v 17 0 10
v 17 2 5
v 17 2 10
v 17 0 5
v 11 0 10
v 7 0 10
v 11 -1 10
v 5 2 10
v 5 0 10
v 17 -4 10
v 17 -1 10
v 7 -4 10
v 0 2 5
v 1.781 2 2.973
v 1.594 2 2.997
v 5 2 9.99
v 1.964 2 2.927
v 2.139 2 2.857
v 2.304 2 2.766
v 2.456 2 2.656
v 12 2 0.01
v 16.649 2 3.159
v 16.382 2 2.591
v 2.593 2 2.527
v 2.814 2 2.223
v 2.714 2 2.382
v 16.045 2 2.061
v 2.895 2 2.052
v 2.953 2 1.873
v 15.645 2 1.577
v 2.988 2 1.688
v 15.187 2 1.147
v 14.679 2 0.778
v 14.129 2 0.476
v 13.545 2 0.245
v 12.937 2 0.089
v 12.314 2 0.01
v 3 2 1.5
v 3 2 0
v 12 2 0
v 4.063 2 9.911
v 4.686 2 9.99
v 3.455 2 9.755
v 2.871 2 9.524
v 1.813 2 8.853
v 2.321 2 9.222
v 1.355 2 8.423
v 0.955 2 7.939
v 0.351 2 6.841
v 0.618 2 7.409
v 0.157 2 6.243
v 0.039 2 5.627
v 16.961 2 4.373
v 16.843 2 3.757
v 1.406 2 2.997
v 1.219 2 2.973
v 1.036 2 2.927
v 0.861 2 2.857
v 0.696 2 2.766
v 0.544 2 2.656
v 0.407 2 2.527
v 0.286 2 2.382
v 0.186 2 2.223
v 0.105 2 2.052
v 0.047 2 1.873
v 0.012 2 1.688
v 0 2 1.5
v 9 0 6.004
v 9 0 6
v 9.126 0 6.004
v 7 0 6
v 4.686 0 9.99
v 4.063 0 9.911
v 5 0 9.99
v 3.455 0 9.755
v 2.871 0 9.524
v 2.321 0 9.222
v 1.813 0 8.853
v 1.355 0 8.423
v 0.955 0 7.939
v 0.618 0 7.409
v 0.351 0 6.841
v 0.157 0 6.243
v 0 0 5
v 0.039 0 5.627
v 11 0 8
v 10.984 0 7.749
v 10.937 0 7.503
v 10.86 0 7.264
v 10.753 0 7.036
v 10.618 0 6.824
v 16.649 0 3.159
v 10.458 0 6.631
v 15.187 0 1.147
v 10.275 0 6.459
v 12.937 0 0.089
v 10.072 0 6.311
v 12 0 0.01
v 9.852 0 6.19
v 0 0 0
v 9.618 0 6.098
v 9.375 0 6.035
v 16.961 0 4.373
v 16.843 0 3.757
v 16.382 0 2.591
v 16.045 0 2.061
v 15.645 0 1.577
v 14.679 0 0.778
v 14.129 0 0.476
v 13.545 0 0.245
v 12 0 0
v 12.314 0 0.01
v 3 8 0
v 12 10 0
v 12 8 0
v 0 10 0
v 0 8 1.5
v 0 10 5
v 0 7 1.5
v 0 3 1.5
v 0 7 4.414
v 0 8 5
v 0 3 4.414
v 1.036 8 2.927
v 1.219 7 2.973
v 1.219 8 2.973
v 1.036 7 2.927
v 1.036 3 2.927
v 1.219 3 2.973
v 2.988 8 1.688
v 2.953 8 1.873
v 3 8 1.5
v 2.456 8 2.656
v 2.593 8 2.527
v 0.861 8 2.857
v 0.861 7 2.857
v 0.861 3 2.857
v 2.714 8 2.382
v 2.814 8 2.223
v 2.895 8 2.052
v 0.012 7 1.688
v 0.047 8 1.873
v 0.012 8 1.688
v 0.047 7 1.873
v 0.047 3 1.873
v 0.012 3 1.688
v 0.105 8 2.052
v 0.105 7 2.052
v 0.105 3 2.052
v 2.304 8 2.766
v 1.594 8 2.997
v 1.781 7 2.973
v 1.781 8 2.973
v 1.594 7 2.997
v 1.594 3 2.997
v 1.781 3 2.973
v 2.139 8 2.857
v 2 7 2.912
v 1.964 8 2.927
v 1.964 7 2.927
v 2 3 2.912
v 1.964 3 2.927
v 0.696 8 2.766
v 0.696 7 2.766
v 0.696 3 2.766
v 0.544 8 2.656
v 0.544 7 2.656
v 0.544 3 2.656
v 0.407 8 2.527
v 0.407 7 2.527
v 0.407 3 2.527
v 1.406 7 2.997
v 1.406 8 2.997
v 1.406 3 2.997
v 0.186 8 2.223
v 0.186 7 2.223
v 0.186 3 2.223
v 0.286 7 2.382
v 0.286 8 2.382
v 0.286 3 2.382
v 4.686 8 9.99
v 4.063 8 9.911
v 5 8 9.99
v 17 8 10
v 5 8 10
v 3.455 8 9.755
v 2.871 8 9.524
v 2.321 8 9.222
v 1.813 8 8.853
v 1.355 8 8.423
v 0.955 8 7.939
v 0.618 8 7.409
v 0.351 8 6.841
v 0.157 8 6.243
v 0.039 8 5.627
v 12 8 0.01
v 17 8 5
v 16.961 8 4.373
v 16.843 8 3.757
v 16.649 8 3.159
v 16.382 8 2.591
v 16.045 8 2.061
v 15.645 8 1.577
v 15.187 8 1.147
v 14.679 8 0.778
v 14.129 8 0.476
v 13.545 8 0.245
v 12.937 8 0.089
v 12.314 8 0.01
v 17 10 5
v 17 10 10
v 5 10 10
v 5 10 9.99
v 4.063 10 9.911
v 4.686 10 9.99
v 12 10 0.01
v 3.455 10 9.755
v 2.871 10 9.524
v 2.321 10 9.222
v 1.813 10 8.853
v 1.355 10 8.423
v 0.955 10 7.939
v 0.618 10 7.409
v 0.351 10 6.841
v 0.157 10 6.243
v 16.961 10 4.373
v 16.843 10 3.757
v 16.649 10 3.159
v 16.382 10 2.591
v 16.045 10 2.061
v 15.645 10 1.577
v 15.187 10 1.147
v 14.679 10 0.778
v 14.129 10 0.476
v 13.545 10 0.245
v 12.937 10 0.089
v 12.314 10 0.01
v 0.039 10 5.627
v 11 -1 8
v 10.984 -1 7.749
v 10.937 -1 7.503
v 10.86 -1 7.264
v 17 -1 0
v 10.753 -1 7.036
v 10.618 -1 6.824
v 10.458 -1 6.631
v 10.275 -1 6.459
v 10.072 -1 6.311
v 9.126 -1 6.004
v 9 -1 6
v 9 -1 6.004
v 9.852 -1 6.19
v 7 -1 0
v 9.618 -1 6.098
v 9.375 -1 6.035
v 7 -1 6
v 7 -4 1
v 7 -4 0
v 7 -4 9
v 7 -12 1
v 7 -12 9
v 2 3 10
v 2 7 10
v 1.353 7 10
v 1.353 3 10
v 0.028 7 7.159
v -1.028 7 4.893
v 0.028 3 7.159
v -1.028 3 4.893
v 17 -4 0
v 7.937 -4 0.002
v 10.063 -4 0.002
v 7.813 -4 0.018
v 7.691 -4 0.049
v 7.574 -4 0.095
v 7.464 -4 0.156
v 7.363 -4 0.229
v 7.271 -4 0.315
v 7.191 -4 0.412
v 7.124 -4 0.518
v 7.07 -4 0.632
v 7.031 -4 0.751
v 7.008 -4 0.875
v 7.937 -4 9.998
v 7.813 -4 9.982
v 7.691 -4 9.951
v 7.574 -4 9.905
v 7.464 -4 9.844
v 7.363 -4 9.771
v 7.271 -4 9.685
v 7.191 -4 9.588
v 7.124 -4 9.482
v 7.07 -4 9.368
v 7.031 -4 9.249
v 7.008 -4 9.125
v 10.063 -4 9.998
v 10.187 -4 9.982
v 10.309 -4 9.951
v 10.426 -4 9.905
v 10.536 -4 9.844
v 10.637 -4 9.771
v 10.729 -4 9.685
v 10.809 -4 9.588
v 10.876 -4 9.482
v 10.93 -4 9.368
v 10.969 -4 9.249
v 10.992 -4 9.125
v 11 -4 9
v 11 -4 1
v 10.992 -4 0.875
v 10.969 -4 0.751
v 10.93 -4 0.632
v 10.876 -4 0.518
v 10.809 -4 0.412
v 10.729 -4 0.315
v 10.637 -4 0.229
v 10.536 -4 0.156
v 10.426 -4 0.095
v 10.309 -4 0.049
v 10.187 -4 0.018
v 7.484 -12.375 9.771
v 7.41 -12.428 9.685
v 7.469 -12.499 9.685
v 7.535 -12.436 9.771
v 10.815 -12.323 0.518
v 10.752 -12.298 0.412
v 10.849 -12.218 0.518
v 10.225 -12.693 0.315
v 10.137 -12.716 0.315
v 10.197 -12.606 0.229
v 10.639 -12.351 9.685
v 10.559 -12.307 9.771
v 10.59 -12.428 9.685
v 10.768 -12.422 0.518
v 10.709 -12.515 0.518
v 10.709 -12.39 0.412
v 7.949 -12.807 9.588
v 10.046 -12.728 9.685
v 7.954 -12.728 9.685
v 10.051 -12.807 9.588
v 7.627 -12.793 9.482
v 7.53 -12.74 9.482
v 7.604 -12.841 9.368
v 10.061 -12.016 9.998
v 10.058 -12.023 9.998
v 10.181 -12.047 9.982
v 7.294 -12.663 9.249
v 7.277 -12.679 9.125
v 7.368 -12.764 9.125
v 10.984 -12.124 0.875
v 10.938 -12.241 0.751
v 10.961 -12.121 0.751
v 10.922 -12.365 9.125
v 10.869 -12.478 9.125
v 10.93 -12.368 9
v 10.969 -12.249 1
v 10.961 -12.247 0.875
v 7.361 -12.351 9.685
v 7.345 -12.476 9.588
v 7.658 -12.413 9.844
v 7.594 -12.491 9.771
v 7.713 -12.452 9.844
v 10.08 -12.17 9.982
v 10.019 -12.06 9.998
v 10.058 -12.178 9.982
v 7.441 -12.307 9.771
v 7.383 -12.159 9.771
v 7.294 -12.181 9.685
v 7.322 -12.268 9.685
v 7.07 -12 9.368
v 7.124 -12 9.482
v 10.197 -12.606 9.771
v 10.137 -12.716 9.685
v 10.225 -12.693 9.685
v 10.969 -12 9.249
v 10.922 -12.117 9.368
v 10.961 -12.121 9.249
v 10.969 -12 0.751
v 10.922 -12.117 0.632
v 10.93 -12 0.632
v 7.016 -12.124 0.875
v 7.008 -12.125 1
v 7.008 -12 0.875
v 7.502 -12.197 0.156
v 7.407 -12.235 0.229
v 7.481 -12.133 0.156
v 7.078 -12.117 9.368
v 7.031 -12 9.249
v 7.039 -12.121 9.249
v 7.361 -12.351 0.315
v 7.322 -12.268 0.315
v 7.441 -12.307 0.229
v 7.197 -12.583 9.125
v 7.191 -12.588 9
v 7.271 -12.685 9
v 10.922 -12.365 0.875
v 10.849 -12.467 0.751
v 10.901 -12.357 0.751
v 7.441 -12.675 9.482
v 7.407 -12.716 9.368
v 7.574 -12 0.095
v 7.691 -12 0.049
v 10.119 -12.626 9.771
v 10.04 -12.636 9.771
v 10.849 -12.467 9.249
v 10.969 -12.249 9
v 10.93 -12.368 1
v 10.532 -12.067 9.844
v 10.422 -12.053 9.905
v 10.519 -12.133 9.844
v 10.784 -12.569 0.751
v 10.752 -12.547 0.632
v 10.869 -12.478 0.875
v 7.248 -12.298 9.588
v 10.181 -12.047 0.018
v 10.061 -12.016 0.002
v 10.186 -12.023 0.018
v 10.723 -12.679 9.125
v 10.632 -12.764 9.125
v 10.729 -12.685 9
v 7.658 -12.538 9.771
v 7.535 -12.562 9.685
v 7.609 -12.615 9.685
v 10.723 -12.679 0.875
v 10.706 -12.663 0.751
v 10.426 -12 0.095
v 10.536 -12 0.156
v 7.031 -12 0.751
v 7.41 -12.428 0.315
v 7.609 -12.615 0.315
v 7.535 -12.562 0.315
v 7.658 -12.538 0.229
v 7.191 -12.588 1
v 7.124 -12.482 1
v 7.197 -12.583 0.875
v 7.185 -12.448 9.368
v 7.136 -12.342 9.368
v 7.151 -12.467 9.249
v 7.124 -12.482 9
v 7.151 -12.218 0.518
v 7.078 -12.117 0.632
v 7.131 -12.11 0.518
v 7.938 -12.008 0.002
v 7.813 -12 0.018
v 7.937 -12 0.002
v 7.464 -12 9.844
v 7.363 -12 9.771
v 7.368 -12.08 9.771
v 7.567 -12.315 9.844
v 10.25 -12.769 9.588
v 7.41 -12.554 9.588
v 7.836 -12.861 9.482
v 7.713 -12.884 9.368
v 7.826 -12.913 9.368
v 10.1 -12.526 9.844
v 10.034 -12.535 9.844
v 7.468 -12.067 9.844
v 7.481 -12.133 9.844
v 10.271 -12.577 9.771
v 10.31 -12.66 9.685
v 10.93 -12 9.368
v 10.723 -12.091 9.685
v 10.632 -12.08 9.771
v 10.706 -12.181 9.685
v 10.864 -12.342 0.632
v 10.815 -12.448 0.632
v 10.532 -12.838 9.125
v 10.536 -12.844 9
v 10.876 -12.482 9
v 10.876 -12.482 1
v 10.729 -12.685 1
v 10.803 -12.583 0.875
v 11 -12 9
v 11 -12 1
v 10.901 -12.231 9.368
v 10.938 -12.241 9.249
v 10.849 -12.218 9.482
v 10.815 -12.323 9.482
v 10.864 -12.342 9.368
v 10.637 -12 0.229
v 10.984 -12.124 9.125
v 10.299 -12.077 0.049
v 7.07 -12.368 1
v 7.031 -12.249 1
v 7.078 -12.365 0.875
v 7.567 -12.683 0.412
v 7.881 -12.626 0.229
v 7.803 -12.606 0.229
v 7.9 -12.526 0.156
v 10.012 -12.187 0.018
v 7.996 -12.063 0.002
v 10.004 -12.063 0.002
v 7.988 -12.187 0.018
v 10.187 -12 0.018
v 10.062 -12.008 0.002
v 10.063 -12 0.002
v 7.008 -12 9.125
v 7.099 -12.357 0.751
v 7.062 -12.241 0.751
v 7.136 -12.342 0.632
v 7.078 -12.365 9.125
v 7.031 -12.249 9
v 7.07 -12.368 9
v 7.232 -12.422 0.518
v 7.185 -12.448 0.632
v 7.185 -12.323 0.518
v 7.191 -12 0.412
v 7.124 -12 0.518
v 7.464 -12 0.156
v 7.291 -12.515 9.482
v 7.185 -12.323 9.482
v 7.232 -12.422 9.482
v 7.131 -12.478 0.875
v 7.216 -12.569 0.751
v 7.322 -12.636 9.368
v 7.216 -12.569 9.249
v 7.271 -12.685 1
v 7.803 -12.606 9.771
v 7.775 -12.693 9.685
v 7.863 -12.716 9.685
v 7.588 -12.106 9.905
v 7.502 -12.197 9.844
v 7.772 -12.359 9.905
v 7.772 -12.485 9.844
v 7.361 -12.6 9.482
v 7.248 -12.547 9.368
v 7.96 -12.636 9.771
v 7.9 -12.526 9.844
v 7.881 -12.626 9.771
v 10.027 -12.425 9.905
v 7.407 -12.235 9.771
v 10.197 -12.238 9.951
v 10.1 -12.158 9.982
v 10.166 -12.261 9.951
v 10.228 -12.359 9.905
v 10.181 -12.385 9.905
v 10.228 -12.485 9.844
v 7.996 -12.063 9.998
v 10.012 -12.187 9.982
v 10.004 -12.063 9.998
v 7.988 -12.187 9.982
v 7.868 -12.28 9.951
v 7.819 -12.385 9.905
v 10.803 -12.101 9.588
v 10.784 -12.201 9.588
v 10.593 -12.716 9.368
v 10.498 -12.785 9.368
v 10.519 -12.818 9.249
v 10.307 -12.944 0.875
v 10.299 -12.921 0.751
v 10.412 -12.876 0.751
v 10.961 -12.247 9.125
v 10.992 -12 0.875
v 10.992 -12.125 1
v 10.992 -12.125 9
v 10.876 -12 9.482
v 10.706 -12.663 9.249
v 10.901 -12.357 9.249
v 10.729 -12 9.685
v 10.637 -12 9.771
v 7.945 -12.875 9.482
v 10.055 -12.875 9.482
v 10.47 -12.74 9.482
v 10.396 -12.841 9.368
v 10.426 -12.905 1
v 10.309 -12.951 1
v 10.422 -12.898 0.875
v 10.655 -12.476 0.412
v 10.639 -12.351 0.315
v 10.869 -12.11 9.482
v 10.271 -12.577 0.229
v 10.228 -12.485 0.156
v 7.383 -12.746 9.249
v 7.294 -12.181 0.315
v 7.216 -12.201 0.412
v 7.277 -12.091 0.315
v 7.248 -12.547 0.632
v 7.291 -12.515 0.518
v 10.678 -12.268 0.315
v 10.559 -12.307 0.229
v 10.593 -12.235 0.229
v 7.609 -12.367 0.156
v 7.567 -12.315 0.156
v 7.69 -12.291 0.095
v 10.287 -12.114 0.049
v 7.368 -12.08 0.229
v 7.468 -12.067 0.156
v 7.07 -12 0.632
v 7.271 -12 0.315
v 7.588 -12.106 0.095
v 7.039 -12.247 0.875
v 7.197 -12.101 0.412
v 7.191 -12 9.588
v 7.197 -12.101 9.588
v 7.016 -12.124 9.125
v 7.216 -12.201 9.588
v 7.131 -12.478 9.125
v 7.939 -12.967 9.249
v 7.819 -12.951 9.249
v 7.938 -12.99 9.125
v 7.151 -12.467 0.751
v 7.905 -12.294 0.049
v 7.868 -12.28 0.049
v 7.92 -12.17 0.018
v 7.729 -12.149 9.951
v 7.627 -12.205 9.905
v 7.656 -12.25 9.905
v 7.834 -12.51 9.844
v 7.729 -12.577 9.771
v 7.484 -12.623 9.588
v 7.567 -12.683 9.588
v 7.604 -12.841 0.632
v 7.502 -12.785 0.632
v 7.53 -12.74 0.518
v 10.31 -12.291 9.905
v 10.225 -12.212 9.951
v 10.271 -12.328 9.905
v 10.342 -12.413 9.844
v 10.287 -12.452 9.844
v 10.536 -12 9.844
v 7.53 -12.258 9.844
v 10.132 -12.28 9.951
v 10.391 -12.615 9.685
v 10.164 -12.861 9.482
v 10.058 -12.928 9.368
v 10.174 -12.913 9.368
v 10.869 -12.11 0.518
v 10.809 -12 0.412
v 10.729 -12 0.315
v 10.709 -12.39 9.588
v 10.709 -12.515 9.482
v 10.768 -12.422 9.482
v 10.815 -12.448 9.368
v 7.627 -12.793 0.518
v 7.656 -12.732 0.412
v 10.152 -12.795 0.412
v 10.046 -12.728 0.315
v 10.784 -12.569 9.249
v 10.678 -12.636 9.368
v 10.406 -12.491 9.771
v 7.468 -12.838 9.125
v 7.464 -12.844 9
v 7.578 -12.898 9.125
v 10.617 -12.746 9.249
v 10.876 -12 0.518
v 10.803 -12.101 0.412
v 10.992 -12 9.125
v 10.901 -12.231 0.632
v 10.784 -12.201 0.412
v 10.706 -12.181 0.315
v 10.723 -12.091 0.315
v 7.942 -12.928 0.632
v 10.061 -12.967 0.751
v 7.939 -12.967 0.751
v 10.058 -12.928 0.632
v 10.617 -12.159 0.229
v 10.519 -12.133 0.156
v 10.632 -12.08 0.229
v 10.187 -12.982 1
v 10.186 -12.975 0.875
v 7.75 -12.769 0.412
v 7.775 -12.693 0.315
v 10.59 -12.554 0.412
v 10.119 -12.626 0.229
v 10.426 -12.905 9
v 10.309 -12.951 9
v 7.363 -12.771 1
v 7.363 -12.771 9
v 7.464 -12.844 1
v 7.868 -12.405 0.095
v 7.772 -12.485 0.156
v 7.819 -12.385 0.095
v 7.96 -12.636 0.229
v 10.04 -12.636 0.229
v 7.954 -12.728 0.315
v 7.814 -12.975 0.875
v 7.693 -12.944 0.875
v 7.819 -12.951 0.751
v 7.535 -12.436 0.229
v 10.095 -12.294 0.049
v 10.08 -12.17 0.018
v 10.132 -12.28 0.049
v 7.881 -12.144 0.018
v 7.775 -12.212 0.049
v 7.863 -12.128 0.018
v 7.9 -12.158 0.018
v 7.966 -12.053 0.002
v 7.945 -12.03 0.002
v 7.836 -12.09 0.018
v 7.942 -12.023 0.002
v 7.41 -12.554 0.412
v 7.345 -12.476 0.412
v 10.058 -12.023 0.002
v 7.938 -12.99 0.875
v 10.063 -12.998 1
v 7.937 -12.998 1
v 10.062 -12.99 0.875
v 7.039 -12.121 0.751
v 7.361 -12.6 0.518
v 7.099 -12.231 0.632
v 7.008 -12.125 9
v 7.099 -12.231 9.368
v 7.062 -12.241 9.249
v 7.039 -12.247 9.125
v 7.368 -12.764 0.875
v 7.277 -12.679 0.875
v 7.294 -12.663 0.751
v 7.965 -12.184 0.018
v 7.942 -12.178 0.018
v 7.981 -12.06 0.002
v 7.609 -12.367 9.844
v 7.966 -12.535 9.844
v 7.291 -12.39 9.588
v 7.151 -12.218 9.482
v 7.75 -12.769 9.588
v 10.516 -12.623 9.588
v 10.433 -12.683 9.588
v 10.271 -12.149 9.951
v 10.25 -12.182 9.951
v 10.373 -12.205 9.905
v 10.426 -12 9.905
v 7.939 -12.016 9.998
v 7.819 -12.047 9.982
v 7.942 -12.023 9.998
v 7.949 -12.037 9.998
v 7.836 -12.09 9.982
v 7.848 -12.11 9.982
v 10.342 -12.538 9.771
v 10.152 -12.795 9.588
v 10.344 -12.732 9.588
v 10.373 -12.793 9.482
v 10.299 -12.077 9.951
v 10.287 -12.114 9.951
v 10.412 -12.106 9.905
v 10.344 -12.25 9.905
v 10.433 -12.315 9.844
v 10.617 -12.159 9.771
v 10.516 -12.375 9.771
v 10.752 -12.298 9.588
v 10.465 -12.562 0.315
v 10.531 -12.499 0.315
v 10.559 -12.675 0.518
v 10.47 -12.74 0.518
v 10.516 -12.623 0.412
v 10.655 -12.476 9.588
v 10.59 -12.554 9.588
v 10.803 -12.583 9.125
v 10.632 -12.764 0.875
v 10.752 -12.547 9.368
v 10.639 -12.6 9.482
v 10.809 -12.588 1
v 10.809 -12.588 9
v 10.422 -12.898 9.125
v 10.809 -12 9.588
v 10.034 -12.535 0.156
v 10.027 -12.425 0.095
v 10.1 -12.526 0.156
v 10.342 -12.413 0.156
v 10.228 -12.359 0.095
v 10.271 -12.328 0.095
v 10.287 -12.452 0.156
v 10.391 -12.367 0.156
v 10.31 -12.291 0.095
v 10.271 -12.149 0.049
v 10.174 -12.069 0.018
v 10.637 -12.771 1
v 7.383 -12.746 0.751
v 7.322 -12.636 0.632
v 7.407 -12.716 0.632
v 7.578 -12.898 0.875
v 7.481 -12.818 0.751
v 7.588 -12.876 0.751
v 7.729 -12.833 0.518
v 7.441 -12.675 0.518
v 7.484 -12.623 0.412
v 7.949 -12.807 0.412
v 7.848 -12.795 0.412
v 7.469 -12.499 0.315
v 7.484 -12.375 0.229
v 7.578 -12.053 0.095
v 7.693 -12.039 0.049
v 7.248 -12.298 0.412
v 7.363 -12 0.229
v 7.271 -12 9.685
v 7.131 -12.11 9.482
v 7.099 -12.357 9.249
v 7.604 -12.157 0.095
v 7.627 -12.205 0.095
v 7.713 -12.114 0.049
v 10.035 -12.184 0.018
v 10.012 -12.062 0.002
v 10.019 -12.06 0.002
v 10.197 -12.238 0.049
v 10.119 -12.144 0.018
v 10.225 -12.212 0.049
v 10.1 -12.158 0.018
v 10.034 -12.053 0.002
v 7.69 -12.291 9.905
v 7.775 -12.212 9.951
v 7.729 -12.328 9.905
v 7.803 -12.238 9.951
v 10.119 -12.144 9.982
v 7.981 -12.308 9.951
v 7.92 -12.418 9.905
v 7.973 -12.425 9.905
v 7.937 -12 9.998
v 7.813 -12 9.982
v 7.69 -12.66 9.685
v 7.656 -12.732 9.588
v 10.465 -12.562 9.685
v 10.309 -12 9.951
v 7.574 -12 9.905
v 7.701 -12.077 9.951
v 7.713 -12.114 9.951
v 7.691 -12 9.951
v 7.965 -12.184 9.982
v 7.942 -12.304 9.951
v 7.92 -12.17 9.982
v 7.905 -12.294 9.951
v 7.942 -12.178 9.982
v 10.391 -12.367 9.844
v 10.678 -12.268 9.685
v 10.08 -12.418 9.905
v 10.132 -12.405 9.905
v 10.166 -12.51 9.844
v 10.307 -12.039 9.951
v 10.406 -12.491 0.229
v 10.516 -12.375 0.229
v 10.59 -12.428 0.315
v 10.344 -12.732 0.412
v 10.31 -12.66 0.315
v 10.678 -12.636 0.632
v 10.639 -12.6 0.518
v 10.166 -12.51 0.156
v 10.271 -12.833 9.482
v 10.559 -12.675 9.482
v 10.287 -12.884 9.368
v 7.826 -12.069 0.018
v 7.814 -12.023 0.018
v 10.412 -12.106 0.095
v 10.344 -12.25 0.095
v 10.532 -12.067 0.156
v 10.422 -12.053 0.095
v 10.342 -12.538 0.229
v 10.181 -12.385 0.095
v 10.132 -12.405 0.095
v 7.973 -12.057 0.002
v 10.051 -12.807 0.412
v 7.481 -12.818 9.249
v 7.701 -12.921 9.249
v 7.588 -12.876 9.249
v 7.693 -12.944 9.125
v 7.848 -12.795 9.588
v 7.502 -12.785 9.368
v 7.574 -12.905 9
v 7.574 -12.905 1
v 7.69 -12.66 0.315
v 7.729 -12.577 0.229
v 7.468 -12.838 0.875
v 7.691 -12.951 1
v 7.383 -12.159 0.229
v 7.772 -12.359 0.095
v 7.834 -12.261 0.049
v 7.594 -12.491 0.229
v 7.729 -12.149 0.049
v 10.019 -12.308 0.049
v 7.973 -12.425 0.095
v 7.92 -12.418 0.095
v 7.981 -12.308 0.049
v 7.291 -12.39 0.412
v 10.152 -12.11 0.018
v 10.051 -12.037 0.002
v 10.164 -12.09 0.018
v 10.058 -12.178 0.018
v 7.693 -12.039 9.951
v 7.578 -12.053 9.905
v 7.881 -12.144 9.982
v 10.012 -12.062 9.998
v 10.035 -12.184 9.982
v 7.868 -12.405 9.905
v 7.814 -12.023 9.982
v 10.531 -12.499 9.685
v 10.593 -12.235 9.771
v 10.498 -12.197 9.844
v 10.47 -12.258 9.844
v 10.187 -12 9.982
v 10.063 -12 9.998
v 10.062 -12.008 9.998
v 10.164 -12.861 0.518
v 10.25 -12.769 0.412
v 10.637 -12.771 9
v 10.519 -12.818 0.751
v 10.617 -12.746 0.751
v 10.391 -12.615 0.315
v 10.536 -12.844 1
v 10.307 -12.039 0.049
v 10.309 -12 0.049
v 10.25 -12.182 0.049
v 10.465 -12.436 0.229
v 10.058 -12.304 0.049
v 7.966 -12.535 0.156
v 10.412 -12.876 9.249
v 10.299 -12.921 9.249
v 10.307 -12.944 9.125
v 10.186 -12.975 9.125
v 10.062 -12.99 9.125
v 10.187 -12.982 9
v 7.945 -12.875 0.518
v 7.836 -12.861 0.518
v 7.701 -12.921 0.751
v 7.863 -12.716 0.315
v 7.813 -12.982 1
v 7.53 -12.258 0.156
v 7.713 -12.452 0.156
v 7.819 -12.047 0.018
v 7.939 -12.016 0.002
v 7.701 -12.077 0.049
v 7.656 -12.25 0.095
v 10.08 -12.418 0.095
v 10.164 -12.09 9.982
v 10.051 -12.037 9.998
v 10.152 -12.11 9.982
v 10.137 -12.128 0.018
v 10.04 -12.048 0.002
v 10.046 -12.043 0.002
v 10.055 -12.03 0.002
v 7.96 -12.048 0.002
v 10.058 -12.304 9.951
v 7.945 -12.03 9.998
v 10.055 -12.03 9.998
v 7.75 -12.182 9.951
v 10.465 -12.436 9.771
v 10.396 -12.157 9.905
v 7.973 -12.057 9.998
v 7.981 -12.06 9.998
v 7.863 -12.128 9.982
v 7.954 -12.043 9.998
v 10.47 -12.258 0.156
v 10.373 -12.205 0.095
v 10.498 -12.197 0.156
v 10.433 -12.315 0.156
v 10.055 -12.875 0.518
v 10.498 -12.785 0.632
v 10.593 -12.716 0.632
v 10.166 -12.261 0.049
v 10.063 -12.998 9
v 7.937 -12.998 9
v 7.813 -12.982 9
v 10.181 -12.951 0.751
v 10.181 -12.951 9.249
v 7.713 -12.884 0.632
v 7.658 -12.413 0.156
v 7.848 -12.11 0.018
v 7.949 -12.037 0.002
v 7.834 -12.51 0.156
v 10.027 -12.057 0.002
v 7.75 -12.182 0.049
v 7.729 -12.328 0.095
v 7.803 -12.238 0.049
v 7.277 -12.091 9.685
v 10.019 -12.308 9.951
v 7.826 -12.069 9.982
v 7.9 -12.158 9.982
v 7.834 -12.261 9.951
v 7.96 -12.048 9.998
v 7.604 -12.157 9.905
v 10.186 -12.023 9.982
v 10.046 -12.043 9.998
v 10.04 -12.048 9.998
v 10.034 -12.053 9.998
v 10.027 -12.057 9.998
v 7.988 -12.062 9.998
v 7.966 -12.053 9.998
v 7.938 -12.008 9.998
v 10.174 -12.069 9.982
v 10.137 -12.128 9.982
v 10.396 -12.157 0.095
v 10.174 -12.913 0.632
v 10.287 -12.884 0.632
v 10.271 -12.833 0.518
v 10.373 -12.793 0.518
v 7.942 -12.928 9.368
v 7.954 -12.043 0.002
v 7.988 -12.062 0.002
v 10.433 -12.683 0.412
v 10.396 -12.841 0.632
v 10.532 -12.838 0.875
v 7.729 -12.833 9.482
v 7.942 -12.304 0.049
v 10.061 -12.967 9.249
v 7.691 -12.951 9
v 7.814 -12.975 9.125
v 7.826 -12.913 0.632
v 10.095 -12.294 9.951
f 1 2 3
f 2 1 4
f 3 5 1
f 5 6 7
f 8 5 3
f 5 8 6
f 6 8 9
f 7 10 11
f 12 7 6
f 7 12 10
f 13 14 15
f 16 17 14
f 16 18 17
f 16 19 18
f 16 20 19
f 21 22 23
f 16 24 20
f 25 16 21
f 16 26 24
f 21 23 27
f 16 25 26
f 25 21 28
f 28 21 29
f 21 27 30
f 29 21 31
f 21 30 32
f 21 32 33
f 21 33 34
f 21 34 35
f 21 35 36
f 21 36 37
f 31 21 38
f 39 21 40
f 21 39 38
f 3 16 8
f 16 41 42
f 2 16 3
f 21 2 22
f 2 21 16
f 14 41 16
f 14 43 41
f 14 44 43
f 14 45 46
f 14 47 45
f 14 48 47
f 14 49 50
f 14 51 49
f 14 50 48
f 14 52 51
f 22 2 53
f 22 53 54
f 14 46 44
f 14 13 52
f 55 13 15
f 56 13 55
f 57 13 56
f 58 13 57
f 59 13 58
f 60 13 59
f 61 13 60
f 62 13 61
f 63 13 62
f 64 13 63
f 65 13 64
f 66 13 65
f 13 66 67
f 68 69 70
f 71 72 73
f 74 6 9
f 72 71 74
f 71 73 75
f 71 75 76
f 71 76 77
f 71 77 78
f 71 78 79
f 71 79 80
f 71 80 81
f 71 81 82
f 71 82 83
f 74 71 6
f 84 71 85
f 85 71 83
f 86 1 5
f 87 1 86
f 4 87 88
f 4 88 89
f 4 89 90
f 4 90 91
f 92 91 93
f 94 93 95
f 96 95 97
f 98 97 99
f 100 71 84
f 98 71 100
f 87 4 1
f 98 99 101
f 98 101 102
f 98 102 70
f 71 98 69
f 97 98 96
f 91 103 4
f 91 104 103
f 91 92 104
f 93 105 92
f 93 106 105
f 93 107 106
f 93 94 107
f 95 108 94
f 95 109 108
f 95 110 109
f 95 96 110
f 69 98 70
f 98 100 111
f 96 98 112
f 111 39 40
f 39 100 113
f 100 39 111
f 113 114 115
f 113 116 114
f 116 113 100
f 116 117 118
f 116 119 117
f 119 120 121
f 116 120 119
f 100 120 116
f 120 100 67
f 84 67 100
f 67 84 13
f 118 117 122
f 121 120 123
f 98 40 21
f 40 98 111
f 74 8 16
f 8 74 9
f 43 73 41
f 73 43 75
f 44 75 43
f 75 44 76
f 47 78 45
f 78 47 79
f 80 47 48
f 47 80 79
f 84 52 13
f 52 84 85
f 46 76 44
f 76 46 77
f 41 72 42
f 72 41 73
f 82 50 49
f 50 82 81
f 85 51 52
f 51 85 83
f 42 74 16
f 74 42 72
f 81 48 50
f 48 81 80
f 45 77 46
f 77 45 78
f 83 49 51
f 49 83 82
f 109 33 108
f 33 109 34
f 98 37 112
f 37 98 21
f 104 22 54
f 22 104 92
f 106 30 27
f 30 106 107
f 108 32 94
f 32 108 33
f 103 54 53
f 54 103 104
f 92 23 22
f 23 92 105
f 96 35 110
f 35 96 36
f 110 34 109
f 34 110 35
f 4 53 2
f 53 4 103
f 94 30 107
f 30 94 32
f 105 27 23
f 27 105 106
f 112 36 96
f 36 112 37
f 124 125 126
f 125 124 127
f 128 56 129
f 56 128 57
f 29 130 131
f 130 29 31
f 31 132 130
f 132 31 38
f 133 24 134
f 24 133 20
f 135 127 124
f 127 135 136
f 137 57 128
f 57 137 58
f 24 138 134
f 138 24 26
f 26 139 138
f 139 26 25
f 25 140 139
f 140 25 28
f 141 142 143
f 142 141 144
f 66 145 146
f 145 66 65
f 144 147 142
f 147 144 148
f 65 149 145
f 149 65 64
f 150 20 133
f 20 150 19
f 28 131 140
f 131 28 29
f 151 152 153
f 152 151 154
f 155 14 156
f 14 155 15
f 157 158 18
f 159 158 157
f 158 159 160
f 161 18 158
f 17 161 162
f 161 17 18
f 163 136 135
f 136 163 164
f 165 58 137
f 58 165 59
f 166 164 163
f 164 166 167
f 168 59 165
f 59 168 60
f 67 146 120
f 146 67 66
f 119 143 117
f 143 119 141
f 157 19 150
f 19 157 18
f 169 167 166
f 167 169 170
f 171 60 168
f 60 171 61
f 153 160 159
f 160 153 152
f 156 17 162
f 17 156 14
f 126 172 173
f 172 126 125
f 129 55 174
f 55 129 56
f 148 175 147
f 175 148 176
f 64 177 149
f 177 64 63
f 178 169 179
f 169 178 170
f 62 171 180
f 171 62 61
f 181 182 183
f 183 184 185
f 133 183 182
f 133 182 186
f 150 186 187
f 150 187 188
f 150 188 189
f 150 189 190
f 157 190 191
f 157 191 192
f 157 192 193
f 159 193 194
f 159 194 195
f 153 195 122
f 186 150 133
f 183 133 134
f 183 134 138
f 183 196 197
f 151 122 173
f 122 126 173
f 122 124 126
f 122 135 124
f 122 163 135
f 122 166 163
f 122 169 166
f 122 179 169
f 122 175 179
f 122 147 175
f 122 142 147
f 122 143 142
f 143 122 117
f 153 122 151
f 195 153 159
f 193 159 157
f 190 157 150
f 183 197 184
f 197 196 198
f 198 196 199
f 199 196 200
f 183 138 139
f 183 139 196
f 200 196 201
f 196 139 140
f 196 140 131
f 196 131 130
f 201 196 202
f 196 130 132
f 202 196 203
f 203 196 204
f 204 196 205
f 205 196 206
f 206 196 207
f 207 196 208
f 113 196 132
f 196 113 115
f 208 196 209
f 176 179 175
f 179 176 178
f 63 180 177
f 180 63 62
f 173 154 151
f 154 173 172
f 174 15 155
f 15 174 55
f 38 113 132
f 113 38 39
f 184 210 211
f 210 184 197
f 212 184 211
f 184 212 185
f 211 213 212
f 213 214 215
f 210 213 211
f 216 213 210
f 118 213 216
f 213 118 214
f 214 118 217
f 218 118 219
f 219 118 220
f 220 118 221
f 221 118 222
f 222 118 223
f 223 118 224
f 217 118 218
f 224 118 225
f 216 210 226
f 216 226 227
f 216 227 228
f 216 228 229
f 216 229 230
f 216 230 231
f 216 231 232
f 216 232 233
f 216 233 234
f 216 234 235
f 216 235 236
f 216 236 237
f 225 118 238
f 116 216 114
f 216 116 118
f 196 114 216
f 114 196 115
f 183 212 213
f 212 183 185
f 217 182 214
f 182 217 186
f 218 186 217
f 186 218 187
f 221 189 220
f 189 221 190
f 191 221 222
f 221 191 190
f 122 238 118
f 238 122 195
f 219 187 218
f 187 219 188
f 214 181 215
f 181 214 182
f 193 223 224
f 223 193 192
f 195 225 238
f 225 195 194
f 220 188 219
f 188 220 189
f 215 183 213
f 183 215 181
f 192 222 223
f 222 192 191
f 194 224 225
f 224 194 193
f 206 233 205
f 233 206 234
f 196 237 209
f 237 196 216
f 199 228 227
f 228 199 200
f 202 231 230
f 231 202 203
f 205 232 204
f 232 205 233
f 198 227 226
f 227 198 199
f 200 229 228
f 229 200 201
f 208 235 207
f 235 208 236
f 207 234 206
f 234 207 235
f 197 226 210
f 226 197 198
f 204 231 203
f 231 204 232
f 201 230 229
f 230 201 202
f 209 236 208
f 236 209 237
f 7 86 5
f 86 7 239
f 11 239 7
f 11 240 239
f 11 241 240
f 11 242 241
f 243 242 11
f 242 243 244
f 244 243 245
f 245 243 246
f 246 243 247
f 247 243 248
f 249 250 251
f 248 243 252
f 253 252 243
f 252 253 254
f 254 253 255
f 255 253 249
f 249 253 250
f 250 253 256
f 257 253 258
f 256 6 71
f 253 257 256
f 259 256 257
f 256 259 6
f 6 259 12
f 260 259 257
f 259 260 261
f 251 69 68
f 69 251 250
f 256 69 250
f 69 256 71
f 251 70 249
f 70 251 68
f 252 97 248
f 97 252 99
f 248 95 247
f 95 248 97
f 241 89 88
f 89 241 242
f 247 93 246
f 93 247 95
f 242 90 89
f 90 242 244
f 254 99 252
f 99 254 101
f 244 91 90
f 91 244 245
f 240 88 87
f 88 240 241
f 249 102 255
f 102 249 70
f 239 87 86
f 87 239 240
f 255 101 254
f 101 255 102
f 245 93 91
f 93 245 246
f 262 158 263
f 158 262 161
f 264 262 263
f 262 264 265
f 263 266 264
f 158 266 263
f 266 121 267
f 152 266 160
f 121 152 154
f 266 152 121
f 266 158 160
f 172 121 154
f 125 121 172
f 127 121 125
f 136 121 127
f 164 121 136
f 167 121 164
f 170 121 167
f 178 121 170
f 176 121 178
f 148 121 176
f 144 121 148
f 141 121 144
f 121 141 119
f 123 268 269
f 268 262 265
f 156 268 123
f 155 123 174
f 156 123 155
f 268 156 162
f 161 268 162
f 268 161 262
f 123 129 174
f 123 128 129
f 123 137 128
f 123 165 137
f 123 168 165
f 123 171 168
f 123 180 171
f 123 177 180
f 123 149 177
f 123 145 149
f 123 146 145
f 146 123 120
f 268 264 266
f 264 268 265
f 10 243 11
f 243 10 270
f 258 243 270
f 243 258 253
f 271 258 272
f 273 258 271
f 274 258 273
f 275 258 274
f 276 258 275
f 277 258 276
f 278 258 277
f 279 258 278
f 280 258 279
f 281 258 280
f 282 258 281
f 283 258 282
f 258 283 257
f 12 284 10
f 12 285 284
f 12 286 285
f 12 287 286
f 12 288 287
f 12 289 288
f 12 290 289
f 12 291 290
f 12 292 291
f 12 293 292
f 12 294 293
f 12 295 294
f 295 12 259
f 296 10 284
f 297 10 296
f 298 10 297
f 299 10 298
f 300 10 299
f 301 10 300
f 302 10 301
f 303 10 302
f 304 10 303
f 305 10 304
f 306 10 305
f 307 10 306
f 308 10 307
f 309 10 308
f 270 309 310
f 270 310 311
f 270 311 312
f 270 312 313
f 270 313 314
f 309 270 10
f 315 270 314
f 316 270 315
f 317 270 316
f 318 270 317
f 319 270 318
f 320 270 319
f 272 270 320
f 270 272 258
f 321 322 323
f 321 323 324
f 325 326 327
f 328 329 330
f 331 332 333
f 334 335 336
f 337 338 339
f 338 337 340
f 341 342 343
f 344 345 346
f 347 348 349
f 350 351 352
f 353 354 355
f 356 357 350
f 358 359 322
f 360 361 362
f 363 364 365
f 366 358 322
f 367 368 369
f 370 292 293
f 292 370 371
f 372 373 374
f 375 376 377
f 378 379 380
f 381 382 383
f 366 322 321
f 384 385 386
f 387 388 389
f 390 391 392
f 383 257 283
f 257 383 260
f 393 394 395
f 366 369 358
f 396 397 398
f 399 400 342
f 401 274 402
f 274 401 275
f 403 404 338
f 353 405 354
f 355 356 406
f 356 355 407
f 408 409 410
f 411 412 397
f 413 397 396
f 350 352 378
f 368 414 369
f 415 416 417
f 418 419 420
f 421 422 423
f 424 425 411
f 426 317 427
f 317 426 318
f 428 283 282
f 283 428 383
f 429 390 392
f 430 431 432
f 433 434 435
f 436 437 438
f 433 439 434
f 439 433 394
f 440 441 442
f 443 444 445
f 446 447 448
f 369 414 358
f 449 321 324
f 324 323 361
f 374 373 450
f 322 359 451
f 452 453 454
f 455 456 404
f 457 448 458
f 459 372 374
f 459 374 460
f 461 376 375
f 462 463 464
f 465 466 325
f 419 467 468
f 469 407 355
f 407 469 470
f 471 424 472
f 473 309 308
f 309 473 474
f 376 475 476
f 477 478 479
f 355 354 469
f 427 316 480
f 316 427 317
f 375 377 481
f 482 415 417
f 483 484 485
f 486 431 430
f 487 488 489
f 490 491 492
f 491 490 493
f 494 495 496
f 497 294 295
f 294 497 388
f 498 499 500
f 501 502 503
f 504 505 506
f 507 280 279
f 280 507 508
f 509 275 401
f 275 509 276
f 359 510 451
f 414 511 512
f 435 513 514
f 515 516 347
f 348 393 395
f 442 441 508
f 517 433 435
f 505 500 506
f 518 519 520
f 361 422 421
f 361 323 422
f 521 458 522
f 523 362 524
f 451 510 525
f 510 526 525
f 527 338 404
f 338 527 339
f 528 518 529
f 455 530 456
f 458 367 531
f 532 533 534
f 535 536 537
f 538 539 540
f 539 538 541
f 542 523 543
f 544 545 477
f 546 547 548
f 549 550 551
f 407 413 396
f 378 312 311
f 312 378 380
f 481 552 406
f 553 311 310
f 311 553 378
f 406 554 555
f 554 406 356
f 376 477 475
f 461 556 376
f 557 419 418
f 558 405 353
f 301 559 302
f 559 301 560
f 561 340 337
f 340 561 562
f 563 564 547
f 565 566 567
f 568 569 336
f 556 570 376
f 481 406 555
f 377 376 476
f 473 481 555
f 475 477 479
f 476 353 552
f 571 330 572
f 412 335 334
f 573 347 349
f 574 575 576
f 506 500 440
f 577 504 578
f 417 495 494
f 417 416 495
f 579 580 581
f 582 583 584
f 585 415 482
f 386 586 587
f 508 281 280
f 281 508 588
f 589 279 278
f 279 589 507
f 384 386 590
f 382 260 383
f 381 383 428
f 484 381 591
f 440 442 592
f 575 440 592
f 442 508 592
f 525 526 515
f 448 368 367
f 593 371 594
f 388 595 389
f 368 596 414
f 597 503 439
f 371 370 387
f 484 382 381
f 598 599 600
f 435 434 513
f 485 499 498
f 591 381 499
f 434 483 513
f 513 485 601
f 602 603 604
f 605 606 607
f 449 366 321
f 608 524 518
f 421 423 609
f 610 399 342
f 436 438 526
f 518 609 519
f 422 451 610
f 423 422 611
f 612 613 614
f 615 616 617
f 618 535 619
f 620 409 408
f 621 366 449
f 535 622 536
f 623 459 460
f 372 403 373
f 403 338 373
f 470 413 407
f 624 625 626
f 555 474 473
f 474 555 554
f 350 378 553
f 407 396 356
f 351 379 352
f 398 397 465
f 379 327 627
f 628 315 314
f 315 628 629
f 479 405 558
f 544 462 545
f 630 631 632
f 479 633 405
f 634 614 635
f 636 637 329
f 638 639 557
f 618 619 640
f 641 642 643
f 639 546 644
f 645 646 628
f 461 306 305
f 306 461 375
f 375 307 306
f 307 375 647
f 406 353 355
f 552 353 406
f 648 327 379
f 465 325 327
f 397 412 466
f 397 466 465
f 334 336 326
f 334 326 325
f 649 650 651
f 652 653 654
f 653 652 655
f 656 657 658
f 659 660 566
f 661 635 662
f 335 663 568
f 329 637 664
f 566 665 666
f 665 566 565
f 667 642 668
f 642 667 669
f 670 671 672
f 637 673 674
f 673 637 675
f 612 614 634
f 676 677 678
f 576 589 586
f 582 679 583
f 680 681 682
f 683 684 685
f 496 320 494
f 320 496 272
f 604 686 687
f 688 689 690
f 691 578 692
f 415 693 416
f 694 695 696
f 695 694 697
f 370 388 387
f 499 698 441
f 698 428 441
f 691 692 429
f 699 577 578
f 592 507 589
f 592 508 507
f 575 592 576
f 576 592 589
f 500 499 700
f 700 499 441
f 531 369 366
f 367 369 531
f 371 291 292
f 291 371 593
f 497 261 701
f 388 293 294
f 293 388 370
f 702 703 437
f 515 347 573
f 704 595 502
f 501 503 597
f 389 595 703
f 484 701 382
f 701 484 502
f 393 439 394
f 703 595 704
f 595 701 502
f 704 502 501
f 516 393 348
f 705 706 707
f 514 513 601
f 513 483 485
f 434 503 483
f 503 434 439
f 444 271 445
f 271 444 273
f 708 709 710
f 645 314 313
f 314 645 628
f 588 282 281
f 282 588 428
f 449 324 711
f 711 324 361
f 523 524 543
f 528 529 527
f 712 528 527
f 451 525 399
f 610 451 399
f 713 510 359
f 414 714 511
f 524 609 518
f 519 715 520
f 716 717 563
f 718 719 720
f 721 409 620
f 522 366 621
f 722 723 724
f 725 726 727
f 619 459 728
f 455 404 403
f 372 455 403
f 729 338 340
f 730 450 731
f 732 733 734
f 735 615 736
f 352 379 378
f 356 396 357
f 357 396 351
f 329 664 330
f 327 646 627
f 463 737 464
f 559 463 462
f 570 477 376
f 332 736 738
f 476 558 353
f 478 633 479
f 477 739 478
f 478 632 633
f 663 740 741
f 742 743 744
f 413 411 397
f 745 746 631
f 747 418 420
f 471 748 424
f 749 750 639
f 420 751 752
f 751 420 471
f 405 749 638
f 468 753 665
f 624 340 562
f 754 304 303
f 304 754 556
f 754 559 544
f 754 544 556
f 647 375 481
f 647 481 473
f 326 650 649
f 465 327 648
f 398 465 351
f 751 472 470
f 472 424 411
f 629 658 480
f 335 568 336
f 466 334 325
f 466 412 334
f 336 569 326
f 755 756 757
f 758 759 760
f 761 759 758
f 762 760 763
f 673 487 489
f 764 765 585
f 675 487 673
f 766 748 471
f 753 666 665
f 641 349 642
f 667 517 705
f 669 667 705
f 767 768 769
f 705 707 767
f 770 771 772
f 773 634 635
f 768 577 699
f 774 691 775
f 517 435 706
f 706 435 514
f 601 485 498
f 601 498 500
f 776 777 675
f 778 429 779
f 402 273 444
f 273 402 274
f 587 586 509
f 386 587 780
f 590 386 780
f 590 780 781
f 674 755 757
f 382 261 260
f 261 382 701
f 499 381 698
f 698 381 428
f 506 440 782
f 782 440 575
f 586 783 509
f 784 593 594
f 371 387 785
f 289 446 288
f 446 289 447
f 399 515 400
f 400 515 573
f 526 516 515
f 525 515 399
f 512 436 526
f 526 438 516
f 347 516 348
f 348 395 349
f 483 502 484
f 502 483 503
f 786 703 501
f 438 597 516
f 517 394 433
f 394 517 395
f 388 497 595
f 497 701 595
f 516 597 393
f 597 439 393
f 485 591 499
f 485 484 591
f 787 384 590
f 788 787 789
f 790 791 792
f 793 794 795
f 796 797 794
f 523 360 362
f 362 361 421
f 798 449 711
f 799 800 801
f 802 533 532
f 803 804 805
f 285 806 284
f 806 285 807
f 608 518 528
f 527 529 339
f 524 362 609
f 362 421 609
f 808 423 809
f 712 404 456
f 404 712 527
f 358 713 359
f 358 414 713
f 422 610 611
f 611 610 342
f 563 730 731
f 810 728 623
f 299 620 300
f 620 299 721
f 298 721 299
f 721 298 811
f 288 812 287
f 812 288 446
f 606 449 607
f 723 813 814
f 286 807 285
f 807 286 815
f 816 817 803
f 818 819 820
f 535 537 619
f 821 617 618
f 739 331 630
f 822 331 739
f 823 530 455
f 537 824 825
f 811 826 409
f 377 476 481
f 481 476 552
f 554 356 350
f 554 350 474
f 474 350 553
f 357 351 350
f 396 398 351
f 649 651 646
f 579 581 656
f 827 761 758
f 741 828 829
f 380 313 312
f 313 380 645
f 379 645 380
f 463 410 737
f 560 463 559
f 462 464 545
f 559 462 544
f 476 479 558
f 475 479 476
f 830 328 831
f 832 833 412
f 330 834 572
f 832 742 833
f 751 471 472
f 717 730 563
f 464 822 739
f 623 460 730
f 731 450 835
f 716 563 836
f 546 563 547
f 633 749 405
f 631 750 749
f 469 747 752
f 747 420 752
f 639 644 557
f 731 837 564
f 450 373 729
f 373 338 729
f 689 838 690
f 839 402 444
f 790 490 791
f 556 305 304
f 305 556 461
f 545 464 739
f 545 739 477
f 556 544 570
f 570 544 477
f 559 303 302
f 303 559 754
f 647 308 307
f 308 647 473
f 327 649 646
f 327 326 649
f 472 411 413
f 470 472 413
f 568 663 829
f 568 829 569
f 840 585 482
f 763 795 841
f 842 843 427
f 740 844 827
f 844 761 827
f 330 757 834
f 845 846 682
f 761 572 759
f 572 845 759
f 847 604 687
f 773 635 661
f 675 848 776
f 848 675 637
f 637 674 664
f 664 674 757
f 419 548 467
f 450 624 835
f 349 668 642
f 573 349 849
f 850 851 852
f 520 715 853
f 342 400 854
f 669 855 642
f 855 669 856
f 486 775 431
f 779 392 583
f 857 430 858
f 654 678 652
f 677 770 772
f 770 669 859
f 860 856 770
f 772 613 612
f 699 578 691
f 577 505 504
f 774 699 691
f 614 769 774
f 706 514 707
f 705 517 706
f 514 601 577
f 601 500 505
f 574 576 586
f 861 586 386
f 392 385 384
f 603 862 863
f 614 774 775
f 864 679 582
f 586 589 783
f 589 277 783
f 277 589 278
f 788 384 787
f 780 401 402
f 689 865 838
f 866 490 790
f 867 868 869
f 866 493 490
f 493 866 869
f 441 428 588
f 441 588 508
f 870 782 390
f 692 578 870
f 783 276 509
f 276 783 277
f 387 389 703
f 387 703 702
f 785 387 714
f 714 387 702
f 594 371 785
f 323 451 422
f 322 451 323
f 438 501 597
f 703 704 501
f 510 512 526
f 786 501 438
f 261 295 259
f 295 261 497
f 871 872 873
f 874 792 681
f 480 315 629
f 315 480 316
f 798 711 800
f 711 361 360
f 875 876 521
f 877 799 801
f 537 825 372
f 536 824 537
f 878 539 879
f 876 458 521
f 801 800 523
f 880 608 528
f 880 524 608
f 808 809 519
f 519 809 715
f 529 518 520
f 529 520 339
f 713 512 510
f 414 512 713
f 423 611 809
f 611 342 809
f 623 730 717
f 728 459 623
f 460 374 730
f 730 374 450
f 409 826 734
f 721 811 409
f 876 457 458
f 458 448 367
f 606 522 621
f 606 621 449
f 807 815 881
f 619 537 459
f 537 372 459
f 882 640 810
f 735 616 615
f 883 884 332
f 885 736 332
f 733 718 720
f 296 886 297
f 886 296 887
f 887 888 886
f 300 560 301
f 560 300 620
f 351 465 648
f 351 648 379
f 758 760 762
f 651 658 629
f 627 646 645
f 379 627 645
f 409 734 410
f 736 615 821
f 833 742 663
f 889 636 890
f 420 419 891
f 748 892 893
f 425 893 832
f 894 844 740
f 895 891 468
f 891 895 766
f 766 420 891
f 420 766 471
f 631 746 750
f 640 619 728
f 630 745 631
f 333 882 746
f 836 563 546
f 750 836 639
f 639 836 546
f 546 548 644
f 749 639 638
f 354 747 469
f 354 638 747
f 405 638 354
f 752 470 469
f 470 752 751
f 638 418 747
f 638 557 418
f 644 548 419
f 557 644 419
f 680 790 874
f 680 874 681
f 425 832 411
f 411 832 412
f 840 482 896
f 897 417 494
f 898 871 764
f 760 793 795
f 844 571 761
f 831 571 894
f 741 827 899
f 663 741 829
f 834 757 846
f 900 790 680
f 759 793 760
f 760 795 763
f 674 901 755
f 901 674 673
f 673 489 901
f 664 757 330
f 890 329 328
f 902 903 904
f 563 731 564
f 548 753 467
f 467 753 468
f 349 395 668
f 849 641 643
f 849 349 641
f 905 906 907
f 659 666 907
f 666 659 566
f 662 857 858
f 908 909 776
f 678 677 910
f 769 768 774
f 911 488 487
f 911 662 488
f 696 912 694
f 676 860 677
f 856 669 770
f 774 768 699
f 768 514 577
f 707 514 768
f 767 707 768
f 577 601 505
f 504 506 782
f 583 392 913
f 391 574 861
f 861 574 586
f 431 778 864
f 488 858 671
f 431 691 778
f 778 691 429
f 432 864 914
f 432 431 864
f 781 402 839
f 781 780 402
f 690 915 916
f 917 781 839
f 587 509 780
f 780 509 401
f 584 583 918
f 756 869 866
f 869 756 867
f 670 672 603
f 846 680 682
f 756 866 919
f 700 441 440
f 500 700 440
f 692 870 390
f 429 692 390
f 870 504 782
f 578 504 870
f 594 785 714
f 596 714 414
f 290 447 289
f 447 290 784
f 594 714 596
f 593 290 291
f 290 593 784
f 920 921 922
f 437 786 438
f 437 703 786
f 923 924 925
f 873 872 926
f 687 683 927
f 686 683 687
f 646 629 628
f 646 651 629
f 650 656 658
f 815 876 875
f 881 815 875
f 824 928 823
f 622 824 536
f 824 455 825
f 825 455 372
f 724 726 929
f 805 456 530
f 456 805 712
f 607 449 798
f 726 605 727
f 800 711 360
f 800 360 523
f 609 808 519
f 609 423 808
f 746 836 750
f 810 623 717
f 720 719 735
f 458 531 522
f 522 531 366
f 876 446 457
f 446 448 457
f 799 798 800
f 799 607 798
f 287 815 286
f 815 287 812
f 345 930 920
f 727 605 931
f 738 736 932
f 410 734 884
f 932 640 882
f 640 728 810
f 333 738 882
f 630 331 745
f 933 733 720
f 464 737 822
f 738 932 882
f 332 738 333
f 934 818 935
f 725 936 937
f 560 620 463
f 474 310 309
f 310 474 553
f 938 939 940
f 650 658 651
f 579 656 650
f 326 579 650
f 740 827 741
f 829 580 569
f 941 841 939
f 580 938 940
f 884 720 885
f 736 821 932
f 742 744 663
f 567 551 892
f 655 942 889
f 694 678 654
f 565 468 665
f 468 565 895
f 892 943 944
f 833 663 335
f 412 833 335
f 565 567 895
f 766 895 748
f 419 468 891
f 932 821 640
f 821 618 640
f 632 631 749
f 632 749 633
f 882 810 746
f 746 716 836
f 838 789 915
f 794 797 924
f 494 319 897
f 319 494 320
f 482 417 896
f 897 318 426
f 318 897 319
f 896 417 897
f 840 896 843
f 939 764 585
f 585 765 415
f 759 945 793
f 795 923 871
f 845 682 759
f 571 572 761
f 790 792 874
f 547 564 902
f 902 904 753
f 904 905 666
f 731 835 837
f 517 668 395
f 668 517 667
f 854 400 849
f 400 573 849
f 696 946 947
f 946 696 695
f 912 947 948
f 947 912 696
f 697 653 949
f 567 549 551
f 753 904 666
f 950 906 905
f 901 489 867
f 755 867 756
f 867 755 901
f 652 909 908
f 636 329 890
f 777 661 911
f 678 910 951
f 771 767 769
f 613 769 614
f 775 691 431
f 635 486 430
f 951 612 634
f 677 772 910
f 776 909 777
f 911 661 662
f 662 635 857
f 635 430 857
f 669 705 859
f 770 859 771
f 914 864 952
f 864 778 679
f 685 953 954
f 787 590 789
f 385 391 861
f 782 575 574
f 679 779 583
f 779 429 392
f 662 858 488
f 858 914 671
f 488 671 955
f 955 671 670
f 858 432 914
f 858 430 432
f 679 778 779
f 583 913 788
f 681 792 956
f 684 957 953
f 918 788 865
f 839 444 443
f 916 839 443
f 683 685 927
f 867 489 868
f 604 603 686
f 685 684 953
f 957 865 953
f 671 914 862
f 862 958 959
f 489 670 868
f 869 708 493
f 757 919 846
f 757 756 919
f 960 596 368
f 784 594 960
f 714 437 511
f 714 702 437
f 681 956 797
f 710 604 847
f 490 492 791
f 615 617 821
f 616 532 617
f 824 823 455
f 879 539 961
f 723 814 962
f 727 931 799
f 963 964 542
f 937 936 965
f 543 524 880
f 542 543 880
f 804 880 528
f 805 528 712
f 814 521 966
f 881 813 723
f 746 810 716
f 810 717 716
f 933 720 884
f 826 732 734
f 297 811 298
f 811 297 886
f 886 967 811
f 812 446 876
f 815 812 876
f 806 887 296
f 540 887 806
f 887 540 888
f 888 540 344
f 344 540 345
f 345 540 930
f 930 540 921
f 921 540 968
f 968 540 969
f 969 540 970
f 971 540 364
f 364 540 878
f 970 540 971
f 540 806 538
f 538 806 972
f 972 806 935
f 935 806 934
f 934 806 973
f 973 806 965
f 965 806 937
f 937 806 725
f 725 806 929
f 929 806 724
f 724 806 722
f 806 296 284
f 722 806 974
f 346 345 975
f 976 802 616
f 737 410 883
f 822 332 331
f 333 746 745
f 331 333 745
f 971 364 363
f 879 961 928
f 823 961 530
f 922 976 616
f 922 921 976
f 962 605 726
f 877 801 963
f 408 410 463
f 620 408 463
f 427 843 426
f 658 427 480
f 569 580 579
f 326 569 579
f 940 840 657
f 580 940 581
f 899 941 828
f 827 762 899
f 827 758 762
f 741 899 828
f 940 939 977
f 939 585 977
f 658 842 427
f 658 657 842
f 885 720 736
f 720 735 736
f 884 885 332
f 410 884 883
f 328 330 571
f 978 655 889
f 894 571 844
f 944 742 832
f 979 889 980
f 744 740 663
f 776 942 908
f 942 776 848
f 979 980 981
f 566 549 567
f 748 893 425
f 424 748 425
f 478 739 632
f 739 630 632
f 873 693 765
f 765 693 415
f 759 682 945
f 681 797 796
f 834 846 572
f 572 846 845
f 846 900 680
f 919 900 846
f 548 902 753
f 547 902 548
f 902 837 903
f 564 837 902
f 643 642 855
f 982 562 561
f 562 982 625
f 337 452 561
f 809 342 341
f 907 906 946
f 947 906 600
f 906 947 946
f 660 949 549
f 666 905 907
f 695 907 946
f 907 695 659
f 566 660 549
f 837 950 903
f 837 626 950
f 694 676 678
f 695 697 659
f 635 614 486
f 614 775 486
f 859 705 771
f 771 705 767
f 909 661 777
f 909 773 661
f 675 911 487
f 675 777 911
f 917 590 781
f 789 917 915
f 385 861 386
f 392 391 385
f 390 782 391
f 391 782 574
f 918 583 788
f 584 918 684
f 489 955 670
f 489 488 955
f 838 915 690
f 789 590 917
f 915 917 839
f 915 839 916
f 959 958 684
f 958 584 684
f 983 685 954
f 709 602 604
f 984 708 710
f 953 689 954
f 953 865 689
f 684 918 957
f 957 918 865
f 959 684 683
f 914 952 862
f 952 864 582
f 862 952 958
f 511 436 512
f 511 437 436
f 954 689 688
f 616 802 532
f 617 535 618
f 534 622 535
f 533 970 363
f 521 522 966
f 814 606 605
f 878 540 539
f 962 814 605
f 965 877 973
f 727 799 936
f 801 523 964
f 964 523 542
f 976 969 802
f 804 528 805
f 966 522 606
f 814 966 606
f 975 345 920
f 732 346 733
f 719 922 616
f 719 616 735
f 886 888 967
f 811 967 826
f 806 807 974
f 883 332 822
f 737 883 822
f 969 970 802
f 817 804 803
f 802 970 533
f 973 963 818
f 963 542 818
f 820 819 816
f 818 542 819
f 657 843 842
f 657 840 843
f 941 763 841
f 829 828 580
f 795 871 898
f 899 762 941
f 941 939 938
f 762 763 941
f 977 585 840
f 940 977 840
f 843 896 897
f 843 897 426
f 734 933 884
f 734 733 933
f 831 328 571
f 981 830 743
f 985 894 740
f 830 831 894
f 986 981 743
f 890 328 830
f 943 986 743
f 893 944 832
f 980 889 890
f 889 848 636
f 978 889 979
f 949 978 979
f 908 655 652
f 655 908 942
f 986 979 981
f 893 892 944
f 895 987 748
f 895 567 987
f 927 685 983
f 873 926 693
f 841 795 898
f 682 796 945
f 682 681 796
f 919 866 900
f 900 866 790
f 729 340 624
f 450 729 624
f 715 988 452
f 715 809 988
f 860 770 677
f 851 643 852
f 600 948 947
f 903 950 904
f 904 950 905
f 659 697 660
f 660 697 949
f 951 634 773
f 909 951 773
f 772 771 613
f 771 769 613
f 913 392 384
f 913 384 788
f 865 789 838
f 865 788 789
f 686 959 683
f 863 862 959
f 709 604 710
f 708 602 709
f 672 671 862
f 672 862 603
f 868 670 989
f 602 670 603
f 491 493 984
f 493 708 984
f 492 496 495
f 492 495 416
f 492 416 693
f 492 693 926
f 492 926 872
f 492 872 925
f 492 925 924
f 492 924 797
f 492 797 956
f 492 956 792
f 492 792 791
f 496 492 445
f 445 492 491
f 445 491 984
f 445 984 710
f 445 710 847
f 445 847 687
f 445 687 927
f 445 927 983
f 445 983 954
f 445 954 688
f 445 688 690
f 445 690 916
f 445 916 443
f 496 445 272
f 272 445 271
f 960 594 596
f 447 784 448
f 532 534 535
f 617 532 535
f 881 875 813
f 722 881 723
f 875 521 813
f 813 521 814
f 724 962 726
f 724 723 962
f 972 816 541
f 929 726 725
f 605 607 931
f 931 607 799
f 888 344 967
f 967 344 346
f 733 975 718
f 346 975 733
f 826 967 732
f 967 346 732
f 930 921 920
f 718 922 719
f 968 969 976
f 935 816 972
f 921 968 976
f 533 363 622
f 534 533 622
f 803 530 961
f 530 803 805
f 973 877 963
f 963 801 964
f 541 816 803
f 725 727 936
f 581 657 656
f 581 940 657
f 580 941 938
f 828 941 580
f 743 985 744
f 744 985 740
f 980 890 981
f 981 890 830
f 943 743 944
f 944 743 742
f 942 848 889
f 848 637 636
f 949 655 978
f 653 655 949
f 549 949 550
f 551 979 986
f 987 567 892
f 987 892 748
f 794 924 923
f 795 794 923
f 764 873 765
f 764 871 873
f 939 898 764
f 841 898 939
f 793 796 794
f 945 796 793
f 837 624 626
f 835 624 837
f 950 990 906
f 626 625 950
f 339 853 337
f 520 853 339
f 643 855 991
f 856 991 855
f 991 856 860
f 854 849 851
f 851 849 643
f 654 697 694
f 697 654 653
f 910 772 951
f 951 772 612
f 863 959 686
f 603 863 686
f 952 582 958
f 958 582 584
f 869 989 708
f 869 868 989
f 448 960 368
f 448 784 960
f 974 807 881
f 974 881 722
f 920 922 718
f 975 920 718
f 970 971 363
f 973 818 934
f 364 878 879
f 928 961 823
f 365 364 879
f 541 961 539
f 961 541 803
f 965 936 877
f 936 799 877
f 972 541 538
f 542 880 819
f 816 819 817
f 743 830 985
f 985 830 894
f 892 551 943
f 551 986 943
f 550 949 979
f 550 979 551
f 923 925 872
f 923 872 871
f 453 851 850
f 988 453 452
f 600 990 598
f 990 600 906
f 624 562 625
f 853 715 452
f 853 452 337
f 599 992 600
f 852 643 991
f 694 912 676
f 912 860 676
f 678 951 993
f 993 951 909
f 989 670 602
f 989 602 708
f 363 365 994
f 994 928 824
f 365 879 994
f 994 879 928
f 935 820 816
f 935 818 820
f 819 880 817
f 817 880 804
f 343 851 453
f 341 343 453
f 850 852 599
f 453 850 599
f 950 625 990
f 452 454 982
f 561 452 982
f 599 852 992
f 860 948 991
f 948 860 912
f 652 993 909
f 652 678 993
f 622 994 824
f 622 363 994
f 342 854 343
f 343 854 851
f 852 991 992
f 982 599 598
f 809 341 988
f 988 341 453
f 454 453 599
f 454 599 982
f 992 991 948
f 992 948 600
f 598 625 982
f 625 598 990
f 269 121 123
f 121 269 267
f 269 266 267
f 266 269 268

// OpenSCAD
$fn=50;

// front

union() {
     translate([10, 0, 5]) {
          cube([7, 2, 5]);
     }
     translate([0, 0, 0]) {
          cube([8, 2, 5]);
     }
     translate([5, 0, 0]) {
          cube([7, 2, 10]);
     }
     translate([5, 2, 5]) {
          rotate(a=90,  v=[1, 0, 0]) {
               cylinder(h=2, r=5);
          }
     }
     translate([12, 2, 5]) {
          rotate(a=90,  v=[1, 0, 0]) {
               cylinder(h=2, r=5);
          }
     }
}

// cable hook

union() {
     translate([1.5, 8, 1.5]) {
          rotate(a=90,  v=[1, 0, 0]) {
               cylinder(h=8, r=1.5);
          }
     }
     translate([0, 2, 0]) {
          cube([3, 7, 1.5]);
     }
}

// back

union() {
     translate([10, 8, 5]) {
          cube([7, 2, 5]);
     }
     translate([0, 8, 0]) {
          cube([8, 2, 5]);
     }
     translate([5, 8, 0]) {
          cube([7, 2, 10]);
     }
     translate([5, 10, 5]) {
          rotate(a=90,  v=[1, 0, 0]) {
               cylinder(h=2, r=5);
          }
     }
     translate([12, 10, 5]) {
          rotate(a=90,  v=[1, 0, 0]) {
               cylinder(h=2, r=5);
          }
     }
}

// shelf hook

translate([7, -4, 0]) {
     cube([10,3,10]);
}

union() {
     translate([9, -1, 8]) {
          cube([2, 1, 2]);
     }
     translate([7, -1, 8]) {
          cube([2, 1, 2]);
     }
     translate([7, -1, 6]) {
          cube([2, 1, 2]);
     }
     translate([9, -0, 8]) {
          rotate(a=90,  v=[1, 0, 0]) {
               cylinder(h=1, r=2);
          }
     }
}

// handle

translate([-4,  10,  -1]) {
     minkowski() {
          translate([6,  -11,  1]) {
               cube([2, 8, 8]);
          }
          translate([6,  -11,  1]) {
               sphere(1);
          }
     }
}

// lock

difference() {
translate([0, 3, 0]) {
          cube([2, 4, 10]);
}
rotate(a=25,  v=[0, 1, 0]) {
translate([-5, 3, 6]) {
          cube([2, 4, 4]);
}
}
}

rotate(a=25,  v=[0, 1, 0]) {
translate([-3, 3, 4]) {
          cube([2, 4, 2.5]);
}
}
